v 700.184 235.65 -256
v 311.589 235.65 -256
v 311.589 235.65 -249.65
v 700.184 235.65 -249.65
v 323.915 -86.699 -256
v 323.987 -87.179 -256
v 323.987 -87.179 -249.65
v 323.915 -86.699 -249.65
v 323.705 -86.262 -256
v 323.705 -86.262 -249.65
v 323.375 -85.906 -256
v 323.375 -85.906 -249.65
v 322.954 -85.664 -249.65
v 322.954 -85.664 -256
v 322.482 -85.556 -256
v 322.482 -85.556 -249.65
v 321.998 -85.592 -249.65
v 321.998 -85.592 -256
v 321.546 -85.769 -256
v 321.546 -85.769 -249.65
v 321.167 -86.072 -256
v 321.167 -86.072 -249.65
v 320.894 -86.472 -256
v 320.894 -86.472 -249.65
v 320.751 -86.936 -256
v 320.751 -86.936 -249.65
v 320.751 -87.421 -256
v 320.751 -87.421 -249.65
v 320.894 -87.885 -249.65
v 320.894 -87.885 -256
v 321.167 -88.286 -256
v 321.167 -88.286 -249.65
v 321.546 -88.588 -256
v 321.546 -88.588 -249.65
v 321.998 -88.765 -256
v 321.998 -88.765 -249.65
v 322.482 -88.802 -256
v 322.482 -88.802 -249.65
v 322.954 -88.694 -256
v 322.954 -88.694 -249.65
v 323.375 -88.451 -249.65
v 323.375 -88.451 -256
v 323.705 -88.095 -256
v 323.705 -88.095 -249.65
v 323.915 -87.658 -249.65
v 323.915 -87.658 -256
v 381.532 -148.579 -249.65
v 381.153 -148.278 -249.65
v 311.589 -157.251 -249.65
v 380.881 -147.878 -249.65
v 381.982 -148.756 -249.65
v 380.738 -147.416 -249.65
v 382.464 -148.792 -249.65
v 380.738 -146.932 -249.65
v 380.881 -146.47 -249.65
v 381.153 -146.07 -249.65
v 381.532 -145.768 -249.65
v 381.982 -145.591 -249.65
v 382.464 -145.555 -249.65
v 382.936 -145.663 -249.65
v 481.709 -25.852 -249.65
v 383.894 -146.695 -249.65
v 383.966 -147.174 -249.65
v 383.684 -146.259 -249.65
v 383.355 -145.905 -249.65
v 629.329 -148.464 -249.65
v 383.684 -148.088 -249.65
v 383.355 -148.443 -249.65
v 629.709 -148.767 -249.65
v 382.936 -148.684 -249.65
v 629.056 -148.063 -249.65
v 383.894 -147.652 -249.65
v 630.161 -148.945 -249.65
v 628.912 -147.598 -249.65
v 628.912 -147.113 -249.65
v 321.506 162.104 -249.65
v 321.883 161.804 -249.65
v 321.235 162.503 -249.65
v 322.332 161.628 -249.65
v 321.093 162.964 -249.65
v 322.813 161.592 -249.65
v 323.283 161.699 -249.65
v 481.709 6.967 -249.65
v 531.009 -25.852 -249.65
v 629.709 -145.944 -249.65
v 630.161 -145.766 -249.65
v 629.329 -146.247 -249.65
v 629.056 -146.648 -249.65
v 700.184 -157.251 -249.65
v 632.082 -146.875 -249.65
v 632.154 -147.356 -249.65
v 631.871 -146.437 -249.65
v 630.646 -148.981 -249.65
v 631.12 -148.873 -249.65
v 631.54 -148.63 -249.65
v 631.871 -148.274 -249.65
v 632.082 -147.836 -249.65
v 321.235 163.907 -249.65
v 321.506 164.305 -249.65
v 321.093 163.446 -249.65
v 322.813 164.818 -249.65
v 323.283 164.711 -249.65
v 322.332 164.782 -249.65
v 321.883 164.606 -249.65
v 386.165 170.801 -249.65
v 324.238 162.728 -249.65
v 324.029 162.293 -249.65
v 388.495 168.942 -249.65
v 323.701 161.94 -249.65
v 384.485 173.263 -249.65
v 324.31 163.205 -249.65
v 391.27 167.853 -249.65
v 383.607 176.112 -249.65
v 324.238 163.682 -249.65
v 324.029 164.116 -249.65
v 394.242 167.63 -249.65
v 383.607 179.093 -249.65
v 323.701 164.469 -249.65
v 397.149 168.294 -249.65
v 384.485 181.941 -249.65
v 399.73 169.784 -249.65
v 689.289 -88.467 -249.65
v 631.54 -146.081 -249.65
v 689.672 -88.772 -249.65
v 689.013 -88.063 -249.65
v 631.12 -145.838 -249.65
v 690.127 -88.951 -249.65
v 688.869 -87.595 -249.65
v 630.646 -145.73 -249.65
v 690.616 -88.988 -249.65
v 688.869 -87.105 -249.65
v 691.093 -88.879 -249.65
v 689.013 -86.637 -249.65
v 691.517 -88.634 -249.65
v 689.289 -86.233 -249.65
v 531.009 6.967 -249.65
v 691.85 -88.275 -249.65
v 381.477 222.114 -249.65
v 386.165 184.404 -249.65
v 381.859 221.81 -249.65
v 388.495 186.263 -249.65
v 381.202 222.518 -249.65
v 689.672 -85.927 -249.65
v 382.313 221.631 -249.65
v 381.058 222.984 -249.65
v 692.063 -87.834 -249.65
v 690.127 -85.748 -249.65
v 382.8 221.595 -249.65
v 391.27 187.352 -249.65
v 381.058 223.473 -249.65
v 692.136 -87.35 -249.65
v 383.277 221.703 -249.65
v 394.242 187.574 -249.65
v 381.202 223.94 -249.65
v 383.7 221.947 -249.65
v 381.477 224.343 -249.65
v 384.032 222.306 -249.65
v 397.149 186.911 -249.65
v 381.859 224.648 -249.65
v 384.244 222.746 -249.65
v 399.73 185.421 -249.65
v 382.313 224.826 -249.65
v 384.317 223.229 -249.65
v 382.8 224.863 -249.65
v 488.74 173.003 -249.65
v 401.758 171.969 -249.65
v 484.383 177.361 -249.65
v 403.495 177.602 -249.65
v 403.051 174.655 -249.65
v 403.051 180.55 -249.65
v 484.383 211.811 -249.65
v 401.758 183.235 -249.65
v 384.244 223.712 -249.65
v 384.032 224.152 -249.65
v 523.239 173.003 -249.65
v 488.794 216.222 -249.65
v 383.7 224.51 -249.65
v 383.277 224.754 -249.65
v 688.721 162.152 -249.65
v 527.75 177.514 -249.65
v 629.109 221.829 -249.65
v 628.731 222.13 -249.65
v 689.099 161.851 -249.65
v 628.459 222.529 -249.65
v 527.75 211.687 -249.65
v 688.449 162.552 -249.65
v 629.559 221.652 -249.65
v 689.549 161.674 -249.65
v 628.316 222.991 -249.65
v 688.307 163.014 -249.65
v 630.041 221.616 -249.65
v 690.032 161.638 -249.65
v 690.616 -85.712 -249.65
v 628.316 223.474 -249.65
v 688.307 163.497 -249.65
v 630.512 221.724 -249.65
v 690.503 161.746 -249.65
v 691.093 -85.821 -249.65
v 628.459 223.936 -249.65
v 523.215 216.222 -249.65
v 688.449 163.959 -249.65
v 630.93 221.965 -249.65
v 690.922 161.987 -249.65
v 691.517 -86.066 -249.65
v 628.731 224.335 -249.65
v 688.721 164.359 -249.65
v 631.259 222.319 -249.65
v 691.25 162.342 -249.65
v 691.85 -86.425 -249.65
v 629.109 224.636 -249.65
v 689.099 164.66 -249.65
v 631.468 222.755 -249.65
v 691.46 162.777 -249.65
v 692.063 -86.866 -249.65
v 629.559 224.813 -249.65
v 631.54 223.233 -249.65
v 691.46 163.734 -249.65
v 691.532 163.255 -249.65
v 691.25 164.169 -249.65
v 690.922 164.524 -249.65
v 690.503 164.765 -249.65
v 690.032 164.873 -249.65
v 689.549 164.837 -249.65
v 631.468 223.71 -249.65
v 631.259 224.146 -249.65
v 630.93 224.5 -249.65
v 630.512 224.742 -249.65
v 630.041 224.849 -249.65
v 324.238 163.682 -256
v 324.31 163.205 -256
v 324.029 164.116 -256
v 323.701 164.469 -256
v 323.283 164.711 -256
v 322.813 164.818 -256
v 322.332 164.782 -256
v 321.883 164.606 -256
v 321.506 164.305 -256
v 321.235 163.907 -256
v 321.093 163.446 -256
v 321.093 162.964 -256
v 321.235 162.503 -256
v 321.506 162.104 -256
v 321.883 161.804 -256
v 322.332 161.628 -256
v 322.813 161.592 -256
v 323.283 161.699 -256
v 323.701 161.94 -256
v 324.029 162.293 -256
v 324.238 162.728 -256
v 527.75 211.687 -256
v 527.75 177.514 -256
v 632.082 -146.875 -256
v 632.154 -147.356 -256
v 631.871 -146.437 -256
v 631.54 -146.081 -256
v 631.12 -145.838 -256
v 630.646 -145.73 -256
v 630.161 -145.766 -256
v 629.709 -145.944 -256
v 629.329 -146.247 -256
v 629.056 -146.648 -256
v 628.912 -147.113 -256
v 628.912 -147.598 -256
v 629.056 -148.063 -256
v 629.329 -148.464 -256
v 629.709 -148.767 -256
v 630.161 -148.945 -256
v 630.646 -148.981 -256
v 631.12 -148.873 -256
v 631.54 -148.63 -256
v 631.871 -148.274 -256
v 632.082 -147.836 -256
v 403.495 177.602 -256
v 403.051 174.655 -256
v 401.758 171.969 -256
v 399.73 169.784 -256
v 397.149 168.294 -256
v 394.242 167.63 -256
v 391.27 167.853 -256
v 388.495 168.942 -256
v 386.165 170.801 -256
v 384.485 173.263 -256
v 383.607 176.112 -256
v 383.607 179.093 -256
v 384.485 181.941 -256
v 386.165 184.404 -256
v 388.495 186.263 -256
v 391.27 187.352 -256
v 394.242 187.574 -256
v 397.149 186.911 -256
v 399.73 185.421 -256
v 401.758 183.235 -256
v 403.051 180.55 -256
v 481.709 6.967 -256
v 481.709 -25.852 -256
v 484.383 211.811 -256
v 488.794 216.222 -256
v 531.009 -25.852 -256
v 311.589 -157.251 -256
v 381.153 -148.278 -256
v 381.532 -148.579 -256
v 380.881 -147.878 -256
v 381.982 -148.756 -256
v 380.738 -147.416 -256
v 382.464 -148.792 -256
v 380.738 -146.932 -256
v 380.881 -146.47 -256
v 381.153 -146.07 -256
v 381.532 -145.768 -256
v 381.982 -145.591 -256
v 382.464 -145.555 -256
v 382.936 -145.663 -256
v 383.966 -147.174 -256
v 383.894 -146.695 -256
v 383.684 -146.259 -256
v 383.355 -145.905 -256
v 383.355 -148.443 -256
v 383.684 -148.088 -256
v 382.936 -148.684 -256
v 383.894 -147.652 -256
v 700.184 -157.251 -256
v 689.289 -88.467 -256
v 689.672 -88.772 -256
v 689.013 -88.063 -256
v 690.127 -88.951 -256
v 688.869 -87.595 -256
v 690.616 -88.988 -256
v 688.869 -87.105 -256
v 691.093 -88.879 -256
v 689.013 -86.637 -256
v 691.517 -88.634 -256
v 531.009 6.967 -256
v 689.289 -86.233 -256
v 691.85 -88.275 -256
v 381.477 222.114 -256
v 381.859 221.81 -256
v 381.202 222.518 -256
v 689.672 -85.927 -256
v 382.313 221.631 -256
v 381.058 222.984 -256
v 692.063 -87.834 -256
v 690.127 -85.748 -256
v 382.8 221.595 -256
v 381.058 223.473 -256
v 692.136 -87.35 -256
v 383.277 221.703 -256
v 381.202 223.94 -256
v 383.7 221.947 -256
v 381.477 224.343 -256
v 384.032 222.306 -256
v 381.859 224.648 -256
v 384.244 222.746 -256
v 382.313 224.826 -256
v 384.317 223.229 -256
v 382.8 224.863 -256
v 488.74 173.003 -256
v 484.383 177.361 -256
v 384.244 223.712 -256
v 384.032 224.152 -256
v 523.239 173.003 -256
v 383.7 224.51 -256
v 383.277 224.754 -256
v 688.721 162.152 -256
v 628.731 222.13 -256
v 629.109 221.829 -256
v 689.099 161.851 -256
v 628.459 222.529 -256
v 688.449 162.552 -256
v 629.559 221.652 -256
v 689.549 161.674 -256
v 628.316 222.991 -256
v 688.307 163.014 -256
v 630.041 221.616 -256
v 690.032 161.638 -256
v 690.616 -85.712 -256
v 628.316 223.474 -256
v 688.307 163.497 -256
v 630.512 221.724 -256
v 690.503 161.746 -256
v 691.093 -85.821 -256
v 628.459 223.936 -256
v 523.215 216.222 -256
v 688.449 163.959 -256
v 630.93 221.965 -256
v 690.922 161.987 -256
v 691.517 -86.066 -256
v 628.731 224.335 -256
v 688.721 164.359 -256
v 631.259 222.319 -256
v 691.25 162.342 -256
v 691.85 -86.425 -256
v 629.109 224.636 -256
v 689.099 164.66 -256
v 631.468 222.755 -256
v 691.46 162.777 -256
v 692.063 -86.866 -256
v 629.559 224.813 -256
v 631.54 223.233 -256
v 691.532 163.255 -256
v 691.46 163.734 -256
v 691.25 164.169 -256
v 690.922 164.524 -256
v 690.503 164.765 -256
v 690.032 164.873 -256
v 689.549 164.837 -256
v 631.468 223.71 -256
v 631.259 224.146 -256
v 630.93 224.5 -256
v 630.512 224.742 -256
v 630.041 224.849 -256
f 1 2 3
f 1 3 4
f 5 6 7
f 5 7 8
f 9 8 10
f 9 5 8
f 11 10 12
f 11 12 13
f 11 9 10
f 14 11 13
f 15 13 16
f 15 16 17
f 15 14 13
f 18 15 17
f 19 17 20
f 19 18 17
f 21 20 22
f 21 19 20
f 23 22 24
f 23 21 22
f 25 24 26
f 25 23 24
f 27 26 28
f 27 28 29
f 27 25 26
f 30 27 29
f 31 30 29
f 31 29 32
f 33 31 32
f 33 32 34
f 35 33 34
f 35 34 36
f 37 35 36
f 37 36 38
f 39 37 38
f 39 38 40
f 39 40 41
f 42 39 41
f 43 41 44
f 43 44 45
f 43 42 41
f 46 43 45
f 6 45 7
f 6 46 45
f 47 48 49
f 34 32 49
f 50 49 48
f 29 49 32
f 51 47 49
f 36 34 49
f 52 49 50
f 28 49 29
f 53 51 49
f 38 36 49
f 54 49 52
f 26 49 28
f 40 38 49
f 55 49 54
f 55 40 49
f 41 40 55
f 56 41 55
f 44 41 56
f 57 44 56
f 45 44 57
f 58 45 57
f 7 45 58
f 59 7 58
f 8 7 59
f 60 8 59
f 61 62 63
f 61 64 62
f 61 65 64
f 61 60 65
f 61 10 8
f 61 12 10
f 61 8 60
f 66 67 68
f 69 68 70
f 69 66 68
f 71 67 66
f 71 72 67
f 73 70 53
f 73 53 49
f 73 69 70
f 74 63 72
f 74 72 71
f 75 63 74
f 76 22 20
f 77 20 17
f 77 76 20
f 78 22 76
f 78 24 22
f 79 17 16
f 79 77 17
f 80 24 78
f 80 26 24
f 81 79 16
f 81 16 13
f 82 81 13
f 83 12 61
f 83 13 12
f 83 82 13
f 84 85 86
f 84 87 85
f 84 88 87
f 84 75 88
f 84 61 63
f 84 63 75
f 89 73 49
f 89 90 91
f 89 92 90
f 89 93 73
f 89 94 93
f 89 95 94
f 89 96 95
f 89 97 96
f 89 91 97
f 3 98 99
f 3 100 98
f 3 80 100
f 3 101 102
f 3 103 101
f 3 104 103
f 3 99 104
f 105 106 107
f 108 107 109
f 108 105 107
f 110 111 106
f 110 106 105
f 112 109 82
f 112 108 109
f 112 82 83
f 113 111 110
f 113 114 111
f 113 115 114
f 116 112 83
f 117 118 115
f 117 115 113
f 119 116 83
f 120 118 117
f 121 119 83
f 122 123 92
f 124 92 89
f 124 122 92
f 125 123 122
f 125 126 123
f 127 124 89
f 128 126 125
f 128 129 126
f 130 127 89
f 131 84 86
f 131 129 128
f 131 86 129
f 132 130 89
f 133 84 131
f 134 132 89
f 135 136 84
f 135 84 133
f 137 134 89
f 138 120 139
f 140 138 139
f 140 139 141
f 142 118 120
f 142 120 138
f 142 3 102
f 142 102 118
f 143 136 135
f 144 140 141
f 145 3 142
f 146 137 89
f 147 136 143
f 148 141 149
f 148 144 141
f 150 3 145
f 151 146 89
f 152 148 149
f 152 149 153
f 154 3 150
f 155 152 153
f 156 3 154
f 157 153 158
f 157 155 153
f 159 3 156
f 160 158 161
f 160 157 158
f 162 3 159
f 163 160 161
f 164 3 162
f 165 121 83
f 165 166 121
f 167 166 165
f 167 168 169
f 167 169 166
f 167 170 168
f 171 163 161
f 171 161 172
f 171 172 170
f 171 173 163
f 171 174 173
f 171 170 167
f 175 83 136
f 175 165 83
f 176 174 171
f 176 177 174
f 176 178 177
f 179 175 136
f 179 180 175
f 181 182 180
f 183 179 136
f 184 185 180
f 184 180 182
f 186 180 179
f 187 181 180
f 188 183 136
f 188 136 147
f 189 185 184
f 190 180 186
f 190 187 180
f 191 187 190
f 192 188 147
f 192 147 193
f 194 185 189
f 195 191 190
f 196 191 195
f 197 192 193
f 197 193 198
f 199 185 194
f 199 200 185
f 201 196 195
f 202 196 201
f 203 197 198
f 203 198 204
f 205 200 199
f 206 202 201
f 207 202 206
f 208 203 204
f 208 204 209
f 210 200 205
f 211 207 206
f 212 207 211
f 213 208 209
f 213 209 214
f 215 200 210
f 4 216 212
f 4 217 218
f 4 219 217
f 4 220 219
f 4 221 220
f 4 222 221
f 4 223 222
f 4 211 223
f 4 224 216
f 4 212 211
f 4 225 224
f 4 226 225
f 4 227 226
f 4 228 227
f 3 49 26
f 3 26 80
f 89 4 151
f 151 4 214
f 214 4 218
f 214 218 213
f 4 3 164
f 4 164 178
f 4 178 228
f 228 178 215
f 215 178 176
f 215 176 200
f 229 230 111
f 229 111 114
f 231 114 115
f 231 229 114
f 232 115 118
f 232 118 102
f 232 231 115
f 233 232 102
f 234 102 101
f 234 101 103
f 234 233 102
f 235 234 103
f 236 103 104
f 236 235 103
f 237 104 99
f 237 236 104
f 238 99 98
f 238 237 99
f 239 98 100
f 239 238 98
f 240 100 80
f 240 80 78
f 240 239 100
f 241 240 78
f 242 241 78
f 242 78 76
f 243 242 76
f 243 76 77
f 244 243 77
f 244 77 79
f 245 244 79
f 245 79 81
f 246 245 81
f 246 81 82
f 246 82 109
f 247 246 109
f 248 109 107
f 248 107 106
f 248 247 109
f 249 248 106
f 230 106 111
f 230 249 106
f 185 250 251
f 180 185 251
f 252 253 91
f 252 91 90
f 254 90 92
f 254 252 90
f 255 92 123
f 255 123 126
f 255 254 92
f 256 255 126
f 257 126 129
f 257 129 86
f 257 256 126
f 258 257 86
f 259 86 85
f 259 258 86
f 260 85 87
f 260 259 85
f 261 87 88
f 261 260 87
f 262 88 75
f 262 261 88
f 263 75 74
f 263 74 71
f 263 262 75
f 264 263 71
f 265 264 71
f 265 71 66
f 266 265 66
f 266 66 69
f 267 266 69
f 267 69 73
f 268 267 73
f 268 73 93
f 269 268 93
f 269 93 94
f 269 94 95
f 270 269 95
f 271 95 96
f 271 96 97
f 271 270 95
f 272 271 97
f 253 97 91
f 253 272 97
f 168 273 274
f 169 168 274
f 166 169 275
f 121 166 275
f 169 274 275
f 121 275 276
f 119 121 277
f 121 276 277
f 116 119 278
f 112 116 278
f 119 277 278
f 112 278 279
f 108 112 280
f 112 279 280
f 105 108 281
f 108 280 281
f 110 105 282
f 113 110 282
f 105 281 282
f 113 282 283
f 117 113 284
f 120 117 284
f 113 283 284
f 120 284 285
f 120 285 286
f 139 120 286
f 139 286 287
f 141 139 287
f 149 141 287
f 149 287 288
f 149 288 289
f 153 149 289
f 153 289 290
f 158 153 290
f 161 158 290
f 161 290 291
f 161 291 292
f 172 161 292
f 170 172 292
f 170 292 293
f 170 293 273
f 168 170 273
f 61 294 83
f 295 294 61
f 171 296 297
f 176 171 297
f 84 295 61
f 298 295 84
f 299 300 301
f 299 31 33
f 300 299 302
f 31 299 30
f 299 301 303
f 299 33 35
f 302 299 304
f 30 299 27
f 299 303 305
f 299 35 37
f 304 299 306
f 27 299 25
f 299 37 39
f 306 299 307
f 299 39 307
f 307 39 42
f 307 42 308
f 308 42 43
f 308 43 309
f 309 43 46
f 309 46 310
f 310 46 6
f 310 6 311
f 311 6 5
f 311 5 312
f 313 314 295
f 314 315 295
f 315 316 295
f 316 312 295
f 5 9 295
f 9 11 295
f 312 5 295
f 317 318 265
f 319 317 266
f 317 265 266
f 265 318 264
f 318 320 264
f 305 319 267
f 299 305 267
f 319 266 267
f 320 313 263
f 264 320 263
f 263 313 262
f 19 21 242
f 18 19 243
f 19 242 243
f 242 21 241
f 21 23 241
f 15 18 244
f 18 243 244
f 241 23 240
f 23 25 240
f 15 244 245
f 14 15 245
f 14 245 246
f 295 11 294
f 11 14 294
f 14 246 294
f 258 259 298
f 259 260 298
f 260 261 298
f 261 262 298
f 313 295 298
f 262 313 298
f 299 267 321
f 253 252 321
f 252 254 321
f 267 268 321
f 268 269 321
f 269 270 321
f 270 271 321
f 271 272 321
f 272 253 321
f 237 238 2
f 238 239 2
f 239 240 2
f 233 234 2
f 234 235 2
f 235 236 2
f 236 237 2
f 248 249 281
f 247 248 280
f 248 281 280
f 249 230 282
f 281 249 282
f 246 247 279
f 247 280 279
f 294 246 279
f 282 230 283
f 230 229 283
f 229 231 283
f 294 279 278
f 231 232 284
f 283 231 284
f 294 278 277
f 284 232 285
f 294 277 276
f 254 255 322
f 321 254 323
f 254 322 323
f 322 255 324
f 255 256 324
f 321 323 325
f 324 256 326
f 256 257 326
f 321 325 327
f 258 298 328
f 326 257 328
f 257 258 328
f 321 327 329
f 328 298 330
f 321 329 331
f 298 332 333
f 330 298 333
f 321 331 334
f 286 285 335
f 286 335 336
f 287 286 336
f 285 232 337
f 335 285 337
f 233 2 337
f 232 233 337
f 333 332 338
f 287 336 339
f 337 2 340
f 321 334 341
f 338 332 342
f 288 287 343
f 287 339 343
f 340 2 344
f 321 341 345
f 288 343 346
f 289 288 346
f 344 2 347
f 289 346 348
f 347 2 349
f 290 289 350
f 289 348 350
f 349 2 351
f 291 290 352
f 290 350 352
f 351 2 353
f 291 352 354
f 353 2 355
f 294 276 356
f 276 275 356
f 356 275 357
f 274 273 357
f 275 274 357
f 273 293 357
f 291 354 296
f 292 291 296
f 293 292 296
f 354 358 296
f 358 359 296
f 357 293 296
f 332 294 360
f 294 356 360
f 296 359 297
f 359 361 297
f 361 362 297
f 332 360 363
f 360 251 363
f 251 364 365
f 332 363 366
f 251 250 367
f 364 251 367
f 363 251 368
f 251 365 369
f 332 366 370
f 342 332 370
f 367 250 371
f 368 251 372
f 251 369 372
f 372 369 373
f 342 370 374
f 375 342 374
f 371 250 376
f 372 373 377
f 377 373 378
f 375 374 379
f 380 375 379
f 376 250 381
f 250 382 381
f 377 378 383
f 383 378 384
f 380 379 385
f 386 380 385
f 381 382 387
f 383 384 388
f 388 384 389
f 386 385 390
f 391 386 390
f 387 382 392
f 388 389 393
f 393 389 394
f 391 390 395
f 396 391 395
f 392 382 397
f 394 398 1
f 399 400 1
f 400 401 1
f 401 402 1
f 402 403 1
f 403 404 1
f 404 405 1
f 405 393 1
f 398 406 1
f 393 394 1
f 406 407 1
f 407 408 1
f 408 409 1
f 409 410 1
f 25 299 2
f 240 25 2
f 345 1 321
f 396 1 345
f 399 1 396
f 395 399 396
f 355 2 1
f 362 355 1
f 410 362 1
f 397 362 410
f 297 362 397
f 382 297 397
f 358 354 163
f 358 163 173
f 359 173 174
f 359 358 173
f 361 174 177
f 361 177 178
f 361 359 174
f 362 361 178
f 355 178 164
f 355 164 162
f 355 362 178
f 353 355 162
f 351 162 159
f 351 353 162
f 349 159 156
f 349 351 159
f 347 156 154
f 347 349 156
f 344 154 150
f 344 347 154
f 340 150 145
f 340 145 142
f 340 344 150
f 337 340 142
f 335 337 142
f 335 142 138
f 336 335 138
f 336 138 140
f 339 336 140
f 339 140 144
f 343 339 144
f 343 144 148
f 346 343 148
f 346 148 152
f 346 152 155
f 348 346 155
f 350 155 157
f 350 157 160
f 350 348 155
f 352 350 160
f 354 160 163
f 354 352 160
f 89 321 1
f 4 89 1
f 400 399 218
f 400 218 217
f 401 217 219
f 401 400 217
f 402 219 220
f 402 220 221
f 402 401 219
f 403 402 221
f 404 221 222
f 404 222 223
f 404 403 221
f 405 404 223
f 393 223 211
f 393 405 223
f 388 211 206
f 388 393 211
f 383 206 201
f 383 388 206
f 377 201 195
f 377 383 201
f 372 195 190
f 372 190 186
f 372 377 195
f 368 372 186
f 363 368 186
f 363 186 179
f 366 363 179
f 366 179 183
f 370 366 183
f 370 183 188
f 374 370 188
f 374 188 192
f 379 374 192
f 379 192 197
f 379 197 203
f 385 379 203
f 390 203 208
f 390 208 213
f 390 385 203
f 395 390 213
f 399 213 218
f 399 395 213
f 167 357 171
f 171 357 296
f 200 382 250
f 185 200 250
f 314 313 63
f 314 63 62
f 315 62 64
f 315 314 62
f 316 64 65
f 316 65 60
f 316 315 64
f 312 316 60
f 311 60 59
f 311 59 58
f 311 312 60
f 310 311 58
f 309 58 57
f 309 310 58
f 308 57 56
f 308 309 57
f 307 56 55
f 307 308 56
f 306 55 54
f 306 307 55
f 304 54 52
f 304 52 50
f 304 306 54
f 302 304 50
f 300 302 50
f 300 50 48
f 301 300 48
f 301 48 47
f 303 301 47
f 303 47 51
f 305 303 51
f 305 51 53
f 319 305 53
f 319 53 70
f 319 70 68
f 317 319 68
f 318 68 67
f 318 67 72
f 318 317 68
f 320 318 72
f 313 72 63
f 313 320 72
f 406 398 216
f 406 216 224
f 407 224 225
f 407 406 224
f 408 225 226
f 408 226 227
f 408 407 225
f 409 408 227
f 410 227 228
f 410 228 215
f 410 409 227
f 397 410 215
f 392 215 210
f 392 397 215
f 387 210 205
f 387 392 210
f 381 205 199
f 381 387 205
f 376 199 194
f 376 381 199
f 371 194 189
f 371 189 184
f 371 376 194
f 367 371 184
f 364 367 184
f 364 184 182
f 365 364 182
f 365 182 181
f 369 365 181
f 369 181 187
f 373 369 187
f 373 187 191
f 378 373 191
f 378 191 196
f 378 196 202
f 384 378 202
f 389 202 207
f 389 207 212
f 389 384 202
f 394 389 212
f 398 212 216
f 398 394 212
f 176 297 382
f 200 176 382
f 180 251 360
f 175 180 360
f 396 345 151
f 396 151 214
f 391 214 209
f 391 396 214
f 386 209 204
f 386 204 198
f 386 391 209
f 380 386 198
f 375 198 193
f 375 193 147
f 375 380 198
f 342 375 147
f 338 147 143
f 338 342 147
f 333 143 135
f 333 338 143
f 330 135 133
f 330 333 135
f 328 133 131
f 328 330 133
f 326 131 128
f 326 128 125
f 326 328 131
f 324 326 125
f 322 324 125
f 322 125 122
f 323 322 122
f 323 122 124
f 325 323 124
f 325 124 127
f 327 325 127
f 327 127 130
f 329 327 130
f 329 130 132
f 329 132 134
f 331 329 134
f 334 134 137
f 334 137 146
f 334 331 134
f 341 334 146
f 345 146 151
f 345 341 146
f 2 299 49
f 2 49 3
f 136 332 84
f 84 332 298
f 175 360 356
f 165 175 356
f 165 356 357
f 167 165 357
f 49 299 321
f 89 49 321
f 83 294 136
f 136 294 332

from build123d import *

# Parameters (mm, degrees)
SKETCH002_W     = 388.595154
SKETCH002_H     = 392.901
SKETCH002_R     = 1.62754
SKETCH002_R_2   = 1.622912
SKETCH002_R_3   = 1.629974
SKETCH002_R_4   = 1.642619
SKETCH002_R_5   = 1.621975
SKETCH002_R_6   = 1.620988
SKETCH002_R_7   = 1.638708
SKETCH002_R_8   = 1.617701
PAD_DEPTH       = 6.35
POCKET001_DEPTH = 57
SKETCH007_W     = 49.299805
SKETCH007_H     = 32.819429
POCKET_DEPTH    = 69
SKETCH009_R     = 10
POCKET003_DEPTH = 26


with BuildPart() as part:
    # Sketch002 → Pad (new body)
    with BuildSketch(Plane.XY.offset(-307)):
        with Locations((505.886505, 39.199462)):
            Rectangle(SKETCH002_W, SKETCH002_H)
        with Locations((322.359876, -87.178603)):
            Circle(SKETCH002_R, mode=Mode.SUBTRACT)
        with Locations((382.343016, -147.173684)):
            Circle(SKETCH002_R_2, mode=Mode.SUBTRACT)
        with Locations((630.524069, -147.355562)):
            Circle(SKETCH002_R_3, mode=Mode.SUBTRACT)
        with Locations((690.492891, -87.34992)):
            Circle(SKETCH002_R_4, mode=Mode.SUBTRACT)
        with Locations((689.91036, 163.255499)):
            Circle(SKETCH002_R_5, mode=Mode.SUBTRACT)
        with Locations((629.919382, 223.232625)):
            Circle(SKETCH002_R_6, mode=Mode.SUBTRACT)
        with Locations((382.677955, 223.228676)):
            Circle(SKETCH002_R_7, mode=Mode.SUBTRACT)
        with Locations((322.692155, 163.204715)):
            Circle(SKETCH002_R_8, mode=Mode.SUBTRACT)
    extrude(amount=PAD_DEPTH)

    # Sketch004 → Pocket001 (cut)
    with BuildSketch(Plane(origin=(0, 0, -307), x_dir=(1, 0, 0), z_dir=(0, 0, -1))):
        Polygon((484.382596, -177.360658), (484.382596, -211.810965), (488.793788, -216.222157), (523.215023, -216.222157), (527.750201, -211.68698), (527.750201, -177.514144), (523.239443, -173.003385), (488.739868, -173.003385), align=None)
    extrude(amount=-POCKET001_DEPTH, mode=Mode.SUBTRACT)

    # Sketch007 → Pocket (cut)
    with BuildSketch(Plane(origin=(0, 0, -307), x_dir=(1, 0, 0), z_dir=(0, 0, -1))):
        with Locations((506.359008, 9.442521)):
            Rectangle(SKETCH007_W, SKETCH007_H)
    extrude(amount=-POCKET_DEPTH, mode=Mode.SUBTRACT)

    # Sketch009 → Pocket003 (cut)
    with BuildSketch(Plane(origin=(0, 0, -307), x_dir=(1, 0, 0), z_dir=(0, 0, -1))):
        with Locations((393.495178, -177.602295)):
            Circle(SKETCH009_R)
    extrude(amount=-POCKET003_DEPTH, mode=Mode.SUBTRACT)


with BuildPart() as part_1:
    # Body placement: moved
    add(part.part.moved(Location((0, 0, 51))))


solid = part_1.part
